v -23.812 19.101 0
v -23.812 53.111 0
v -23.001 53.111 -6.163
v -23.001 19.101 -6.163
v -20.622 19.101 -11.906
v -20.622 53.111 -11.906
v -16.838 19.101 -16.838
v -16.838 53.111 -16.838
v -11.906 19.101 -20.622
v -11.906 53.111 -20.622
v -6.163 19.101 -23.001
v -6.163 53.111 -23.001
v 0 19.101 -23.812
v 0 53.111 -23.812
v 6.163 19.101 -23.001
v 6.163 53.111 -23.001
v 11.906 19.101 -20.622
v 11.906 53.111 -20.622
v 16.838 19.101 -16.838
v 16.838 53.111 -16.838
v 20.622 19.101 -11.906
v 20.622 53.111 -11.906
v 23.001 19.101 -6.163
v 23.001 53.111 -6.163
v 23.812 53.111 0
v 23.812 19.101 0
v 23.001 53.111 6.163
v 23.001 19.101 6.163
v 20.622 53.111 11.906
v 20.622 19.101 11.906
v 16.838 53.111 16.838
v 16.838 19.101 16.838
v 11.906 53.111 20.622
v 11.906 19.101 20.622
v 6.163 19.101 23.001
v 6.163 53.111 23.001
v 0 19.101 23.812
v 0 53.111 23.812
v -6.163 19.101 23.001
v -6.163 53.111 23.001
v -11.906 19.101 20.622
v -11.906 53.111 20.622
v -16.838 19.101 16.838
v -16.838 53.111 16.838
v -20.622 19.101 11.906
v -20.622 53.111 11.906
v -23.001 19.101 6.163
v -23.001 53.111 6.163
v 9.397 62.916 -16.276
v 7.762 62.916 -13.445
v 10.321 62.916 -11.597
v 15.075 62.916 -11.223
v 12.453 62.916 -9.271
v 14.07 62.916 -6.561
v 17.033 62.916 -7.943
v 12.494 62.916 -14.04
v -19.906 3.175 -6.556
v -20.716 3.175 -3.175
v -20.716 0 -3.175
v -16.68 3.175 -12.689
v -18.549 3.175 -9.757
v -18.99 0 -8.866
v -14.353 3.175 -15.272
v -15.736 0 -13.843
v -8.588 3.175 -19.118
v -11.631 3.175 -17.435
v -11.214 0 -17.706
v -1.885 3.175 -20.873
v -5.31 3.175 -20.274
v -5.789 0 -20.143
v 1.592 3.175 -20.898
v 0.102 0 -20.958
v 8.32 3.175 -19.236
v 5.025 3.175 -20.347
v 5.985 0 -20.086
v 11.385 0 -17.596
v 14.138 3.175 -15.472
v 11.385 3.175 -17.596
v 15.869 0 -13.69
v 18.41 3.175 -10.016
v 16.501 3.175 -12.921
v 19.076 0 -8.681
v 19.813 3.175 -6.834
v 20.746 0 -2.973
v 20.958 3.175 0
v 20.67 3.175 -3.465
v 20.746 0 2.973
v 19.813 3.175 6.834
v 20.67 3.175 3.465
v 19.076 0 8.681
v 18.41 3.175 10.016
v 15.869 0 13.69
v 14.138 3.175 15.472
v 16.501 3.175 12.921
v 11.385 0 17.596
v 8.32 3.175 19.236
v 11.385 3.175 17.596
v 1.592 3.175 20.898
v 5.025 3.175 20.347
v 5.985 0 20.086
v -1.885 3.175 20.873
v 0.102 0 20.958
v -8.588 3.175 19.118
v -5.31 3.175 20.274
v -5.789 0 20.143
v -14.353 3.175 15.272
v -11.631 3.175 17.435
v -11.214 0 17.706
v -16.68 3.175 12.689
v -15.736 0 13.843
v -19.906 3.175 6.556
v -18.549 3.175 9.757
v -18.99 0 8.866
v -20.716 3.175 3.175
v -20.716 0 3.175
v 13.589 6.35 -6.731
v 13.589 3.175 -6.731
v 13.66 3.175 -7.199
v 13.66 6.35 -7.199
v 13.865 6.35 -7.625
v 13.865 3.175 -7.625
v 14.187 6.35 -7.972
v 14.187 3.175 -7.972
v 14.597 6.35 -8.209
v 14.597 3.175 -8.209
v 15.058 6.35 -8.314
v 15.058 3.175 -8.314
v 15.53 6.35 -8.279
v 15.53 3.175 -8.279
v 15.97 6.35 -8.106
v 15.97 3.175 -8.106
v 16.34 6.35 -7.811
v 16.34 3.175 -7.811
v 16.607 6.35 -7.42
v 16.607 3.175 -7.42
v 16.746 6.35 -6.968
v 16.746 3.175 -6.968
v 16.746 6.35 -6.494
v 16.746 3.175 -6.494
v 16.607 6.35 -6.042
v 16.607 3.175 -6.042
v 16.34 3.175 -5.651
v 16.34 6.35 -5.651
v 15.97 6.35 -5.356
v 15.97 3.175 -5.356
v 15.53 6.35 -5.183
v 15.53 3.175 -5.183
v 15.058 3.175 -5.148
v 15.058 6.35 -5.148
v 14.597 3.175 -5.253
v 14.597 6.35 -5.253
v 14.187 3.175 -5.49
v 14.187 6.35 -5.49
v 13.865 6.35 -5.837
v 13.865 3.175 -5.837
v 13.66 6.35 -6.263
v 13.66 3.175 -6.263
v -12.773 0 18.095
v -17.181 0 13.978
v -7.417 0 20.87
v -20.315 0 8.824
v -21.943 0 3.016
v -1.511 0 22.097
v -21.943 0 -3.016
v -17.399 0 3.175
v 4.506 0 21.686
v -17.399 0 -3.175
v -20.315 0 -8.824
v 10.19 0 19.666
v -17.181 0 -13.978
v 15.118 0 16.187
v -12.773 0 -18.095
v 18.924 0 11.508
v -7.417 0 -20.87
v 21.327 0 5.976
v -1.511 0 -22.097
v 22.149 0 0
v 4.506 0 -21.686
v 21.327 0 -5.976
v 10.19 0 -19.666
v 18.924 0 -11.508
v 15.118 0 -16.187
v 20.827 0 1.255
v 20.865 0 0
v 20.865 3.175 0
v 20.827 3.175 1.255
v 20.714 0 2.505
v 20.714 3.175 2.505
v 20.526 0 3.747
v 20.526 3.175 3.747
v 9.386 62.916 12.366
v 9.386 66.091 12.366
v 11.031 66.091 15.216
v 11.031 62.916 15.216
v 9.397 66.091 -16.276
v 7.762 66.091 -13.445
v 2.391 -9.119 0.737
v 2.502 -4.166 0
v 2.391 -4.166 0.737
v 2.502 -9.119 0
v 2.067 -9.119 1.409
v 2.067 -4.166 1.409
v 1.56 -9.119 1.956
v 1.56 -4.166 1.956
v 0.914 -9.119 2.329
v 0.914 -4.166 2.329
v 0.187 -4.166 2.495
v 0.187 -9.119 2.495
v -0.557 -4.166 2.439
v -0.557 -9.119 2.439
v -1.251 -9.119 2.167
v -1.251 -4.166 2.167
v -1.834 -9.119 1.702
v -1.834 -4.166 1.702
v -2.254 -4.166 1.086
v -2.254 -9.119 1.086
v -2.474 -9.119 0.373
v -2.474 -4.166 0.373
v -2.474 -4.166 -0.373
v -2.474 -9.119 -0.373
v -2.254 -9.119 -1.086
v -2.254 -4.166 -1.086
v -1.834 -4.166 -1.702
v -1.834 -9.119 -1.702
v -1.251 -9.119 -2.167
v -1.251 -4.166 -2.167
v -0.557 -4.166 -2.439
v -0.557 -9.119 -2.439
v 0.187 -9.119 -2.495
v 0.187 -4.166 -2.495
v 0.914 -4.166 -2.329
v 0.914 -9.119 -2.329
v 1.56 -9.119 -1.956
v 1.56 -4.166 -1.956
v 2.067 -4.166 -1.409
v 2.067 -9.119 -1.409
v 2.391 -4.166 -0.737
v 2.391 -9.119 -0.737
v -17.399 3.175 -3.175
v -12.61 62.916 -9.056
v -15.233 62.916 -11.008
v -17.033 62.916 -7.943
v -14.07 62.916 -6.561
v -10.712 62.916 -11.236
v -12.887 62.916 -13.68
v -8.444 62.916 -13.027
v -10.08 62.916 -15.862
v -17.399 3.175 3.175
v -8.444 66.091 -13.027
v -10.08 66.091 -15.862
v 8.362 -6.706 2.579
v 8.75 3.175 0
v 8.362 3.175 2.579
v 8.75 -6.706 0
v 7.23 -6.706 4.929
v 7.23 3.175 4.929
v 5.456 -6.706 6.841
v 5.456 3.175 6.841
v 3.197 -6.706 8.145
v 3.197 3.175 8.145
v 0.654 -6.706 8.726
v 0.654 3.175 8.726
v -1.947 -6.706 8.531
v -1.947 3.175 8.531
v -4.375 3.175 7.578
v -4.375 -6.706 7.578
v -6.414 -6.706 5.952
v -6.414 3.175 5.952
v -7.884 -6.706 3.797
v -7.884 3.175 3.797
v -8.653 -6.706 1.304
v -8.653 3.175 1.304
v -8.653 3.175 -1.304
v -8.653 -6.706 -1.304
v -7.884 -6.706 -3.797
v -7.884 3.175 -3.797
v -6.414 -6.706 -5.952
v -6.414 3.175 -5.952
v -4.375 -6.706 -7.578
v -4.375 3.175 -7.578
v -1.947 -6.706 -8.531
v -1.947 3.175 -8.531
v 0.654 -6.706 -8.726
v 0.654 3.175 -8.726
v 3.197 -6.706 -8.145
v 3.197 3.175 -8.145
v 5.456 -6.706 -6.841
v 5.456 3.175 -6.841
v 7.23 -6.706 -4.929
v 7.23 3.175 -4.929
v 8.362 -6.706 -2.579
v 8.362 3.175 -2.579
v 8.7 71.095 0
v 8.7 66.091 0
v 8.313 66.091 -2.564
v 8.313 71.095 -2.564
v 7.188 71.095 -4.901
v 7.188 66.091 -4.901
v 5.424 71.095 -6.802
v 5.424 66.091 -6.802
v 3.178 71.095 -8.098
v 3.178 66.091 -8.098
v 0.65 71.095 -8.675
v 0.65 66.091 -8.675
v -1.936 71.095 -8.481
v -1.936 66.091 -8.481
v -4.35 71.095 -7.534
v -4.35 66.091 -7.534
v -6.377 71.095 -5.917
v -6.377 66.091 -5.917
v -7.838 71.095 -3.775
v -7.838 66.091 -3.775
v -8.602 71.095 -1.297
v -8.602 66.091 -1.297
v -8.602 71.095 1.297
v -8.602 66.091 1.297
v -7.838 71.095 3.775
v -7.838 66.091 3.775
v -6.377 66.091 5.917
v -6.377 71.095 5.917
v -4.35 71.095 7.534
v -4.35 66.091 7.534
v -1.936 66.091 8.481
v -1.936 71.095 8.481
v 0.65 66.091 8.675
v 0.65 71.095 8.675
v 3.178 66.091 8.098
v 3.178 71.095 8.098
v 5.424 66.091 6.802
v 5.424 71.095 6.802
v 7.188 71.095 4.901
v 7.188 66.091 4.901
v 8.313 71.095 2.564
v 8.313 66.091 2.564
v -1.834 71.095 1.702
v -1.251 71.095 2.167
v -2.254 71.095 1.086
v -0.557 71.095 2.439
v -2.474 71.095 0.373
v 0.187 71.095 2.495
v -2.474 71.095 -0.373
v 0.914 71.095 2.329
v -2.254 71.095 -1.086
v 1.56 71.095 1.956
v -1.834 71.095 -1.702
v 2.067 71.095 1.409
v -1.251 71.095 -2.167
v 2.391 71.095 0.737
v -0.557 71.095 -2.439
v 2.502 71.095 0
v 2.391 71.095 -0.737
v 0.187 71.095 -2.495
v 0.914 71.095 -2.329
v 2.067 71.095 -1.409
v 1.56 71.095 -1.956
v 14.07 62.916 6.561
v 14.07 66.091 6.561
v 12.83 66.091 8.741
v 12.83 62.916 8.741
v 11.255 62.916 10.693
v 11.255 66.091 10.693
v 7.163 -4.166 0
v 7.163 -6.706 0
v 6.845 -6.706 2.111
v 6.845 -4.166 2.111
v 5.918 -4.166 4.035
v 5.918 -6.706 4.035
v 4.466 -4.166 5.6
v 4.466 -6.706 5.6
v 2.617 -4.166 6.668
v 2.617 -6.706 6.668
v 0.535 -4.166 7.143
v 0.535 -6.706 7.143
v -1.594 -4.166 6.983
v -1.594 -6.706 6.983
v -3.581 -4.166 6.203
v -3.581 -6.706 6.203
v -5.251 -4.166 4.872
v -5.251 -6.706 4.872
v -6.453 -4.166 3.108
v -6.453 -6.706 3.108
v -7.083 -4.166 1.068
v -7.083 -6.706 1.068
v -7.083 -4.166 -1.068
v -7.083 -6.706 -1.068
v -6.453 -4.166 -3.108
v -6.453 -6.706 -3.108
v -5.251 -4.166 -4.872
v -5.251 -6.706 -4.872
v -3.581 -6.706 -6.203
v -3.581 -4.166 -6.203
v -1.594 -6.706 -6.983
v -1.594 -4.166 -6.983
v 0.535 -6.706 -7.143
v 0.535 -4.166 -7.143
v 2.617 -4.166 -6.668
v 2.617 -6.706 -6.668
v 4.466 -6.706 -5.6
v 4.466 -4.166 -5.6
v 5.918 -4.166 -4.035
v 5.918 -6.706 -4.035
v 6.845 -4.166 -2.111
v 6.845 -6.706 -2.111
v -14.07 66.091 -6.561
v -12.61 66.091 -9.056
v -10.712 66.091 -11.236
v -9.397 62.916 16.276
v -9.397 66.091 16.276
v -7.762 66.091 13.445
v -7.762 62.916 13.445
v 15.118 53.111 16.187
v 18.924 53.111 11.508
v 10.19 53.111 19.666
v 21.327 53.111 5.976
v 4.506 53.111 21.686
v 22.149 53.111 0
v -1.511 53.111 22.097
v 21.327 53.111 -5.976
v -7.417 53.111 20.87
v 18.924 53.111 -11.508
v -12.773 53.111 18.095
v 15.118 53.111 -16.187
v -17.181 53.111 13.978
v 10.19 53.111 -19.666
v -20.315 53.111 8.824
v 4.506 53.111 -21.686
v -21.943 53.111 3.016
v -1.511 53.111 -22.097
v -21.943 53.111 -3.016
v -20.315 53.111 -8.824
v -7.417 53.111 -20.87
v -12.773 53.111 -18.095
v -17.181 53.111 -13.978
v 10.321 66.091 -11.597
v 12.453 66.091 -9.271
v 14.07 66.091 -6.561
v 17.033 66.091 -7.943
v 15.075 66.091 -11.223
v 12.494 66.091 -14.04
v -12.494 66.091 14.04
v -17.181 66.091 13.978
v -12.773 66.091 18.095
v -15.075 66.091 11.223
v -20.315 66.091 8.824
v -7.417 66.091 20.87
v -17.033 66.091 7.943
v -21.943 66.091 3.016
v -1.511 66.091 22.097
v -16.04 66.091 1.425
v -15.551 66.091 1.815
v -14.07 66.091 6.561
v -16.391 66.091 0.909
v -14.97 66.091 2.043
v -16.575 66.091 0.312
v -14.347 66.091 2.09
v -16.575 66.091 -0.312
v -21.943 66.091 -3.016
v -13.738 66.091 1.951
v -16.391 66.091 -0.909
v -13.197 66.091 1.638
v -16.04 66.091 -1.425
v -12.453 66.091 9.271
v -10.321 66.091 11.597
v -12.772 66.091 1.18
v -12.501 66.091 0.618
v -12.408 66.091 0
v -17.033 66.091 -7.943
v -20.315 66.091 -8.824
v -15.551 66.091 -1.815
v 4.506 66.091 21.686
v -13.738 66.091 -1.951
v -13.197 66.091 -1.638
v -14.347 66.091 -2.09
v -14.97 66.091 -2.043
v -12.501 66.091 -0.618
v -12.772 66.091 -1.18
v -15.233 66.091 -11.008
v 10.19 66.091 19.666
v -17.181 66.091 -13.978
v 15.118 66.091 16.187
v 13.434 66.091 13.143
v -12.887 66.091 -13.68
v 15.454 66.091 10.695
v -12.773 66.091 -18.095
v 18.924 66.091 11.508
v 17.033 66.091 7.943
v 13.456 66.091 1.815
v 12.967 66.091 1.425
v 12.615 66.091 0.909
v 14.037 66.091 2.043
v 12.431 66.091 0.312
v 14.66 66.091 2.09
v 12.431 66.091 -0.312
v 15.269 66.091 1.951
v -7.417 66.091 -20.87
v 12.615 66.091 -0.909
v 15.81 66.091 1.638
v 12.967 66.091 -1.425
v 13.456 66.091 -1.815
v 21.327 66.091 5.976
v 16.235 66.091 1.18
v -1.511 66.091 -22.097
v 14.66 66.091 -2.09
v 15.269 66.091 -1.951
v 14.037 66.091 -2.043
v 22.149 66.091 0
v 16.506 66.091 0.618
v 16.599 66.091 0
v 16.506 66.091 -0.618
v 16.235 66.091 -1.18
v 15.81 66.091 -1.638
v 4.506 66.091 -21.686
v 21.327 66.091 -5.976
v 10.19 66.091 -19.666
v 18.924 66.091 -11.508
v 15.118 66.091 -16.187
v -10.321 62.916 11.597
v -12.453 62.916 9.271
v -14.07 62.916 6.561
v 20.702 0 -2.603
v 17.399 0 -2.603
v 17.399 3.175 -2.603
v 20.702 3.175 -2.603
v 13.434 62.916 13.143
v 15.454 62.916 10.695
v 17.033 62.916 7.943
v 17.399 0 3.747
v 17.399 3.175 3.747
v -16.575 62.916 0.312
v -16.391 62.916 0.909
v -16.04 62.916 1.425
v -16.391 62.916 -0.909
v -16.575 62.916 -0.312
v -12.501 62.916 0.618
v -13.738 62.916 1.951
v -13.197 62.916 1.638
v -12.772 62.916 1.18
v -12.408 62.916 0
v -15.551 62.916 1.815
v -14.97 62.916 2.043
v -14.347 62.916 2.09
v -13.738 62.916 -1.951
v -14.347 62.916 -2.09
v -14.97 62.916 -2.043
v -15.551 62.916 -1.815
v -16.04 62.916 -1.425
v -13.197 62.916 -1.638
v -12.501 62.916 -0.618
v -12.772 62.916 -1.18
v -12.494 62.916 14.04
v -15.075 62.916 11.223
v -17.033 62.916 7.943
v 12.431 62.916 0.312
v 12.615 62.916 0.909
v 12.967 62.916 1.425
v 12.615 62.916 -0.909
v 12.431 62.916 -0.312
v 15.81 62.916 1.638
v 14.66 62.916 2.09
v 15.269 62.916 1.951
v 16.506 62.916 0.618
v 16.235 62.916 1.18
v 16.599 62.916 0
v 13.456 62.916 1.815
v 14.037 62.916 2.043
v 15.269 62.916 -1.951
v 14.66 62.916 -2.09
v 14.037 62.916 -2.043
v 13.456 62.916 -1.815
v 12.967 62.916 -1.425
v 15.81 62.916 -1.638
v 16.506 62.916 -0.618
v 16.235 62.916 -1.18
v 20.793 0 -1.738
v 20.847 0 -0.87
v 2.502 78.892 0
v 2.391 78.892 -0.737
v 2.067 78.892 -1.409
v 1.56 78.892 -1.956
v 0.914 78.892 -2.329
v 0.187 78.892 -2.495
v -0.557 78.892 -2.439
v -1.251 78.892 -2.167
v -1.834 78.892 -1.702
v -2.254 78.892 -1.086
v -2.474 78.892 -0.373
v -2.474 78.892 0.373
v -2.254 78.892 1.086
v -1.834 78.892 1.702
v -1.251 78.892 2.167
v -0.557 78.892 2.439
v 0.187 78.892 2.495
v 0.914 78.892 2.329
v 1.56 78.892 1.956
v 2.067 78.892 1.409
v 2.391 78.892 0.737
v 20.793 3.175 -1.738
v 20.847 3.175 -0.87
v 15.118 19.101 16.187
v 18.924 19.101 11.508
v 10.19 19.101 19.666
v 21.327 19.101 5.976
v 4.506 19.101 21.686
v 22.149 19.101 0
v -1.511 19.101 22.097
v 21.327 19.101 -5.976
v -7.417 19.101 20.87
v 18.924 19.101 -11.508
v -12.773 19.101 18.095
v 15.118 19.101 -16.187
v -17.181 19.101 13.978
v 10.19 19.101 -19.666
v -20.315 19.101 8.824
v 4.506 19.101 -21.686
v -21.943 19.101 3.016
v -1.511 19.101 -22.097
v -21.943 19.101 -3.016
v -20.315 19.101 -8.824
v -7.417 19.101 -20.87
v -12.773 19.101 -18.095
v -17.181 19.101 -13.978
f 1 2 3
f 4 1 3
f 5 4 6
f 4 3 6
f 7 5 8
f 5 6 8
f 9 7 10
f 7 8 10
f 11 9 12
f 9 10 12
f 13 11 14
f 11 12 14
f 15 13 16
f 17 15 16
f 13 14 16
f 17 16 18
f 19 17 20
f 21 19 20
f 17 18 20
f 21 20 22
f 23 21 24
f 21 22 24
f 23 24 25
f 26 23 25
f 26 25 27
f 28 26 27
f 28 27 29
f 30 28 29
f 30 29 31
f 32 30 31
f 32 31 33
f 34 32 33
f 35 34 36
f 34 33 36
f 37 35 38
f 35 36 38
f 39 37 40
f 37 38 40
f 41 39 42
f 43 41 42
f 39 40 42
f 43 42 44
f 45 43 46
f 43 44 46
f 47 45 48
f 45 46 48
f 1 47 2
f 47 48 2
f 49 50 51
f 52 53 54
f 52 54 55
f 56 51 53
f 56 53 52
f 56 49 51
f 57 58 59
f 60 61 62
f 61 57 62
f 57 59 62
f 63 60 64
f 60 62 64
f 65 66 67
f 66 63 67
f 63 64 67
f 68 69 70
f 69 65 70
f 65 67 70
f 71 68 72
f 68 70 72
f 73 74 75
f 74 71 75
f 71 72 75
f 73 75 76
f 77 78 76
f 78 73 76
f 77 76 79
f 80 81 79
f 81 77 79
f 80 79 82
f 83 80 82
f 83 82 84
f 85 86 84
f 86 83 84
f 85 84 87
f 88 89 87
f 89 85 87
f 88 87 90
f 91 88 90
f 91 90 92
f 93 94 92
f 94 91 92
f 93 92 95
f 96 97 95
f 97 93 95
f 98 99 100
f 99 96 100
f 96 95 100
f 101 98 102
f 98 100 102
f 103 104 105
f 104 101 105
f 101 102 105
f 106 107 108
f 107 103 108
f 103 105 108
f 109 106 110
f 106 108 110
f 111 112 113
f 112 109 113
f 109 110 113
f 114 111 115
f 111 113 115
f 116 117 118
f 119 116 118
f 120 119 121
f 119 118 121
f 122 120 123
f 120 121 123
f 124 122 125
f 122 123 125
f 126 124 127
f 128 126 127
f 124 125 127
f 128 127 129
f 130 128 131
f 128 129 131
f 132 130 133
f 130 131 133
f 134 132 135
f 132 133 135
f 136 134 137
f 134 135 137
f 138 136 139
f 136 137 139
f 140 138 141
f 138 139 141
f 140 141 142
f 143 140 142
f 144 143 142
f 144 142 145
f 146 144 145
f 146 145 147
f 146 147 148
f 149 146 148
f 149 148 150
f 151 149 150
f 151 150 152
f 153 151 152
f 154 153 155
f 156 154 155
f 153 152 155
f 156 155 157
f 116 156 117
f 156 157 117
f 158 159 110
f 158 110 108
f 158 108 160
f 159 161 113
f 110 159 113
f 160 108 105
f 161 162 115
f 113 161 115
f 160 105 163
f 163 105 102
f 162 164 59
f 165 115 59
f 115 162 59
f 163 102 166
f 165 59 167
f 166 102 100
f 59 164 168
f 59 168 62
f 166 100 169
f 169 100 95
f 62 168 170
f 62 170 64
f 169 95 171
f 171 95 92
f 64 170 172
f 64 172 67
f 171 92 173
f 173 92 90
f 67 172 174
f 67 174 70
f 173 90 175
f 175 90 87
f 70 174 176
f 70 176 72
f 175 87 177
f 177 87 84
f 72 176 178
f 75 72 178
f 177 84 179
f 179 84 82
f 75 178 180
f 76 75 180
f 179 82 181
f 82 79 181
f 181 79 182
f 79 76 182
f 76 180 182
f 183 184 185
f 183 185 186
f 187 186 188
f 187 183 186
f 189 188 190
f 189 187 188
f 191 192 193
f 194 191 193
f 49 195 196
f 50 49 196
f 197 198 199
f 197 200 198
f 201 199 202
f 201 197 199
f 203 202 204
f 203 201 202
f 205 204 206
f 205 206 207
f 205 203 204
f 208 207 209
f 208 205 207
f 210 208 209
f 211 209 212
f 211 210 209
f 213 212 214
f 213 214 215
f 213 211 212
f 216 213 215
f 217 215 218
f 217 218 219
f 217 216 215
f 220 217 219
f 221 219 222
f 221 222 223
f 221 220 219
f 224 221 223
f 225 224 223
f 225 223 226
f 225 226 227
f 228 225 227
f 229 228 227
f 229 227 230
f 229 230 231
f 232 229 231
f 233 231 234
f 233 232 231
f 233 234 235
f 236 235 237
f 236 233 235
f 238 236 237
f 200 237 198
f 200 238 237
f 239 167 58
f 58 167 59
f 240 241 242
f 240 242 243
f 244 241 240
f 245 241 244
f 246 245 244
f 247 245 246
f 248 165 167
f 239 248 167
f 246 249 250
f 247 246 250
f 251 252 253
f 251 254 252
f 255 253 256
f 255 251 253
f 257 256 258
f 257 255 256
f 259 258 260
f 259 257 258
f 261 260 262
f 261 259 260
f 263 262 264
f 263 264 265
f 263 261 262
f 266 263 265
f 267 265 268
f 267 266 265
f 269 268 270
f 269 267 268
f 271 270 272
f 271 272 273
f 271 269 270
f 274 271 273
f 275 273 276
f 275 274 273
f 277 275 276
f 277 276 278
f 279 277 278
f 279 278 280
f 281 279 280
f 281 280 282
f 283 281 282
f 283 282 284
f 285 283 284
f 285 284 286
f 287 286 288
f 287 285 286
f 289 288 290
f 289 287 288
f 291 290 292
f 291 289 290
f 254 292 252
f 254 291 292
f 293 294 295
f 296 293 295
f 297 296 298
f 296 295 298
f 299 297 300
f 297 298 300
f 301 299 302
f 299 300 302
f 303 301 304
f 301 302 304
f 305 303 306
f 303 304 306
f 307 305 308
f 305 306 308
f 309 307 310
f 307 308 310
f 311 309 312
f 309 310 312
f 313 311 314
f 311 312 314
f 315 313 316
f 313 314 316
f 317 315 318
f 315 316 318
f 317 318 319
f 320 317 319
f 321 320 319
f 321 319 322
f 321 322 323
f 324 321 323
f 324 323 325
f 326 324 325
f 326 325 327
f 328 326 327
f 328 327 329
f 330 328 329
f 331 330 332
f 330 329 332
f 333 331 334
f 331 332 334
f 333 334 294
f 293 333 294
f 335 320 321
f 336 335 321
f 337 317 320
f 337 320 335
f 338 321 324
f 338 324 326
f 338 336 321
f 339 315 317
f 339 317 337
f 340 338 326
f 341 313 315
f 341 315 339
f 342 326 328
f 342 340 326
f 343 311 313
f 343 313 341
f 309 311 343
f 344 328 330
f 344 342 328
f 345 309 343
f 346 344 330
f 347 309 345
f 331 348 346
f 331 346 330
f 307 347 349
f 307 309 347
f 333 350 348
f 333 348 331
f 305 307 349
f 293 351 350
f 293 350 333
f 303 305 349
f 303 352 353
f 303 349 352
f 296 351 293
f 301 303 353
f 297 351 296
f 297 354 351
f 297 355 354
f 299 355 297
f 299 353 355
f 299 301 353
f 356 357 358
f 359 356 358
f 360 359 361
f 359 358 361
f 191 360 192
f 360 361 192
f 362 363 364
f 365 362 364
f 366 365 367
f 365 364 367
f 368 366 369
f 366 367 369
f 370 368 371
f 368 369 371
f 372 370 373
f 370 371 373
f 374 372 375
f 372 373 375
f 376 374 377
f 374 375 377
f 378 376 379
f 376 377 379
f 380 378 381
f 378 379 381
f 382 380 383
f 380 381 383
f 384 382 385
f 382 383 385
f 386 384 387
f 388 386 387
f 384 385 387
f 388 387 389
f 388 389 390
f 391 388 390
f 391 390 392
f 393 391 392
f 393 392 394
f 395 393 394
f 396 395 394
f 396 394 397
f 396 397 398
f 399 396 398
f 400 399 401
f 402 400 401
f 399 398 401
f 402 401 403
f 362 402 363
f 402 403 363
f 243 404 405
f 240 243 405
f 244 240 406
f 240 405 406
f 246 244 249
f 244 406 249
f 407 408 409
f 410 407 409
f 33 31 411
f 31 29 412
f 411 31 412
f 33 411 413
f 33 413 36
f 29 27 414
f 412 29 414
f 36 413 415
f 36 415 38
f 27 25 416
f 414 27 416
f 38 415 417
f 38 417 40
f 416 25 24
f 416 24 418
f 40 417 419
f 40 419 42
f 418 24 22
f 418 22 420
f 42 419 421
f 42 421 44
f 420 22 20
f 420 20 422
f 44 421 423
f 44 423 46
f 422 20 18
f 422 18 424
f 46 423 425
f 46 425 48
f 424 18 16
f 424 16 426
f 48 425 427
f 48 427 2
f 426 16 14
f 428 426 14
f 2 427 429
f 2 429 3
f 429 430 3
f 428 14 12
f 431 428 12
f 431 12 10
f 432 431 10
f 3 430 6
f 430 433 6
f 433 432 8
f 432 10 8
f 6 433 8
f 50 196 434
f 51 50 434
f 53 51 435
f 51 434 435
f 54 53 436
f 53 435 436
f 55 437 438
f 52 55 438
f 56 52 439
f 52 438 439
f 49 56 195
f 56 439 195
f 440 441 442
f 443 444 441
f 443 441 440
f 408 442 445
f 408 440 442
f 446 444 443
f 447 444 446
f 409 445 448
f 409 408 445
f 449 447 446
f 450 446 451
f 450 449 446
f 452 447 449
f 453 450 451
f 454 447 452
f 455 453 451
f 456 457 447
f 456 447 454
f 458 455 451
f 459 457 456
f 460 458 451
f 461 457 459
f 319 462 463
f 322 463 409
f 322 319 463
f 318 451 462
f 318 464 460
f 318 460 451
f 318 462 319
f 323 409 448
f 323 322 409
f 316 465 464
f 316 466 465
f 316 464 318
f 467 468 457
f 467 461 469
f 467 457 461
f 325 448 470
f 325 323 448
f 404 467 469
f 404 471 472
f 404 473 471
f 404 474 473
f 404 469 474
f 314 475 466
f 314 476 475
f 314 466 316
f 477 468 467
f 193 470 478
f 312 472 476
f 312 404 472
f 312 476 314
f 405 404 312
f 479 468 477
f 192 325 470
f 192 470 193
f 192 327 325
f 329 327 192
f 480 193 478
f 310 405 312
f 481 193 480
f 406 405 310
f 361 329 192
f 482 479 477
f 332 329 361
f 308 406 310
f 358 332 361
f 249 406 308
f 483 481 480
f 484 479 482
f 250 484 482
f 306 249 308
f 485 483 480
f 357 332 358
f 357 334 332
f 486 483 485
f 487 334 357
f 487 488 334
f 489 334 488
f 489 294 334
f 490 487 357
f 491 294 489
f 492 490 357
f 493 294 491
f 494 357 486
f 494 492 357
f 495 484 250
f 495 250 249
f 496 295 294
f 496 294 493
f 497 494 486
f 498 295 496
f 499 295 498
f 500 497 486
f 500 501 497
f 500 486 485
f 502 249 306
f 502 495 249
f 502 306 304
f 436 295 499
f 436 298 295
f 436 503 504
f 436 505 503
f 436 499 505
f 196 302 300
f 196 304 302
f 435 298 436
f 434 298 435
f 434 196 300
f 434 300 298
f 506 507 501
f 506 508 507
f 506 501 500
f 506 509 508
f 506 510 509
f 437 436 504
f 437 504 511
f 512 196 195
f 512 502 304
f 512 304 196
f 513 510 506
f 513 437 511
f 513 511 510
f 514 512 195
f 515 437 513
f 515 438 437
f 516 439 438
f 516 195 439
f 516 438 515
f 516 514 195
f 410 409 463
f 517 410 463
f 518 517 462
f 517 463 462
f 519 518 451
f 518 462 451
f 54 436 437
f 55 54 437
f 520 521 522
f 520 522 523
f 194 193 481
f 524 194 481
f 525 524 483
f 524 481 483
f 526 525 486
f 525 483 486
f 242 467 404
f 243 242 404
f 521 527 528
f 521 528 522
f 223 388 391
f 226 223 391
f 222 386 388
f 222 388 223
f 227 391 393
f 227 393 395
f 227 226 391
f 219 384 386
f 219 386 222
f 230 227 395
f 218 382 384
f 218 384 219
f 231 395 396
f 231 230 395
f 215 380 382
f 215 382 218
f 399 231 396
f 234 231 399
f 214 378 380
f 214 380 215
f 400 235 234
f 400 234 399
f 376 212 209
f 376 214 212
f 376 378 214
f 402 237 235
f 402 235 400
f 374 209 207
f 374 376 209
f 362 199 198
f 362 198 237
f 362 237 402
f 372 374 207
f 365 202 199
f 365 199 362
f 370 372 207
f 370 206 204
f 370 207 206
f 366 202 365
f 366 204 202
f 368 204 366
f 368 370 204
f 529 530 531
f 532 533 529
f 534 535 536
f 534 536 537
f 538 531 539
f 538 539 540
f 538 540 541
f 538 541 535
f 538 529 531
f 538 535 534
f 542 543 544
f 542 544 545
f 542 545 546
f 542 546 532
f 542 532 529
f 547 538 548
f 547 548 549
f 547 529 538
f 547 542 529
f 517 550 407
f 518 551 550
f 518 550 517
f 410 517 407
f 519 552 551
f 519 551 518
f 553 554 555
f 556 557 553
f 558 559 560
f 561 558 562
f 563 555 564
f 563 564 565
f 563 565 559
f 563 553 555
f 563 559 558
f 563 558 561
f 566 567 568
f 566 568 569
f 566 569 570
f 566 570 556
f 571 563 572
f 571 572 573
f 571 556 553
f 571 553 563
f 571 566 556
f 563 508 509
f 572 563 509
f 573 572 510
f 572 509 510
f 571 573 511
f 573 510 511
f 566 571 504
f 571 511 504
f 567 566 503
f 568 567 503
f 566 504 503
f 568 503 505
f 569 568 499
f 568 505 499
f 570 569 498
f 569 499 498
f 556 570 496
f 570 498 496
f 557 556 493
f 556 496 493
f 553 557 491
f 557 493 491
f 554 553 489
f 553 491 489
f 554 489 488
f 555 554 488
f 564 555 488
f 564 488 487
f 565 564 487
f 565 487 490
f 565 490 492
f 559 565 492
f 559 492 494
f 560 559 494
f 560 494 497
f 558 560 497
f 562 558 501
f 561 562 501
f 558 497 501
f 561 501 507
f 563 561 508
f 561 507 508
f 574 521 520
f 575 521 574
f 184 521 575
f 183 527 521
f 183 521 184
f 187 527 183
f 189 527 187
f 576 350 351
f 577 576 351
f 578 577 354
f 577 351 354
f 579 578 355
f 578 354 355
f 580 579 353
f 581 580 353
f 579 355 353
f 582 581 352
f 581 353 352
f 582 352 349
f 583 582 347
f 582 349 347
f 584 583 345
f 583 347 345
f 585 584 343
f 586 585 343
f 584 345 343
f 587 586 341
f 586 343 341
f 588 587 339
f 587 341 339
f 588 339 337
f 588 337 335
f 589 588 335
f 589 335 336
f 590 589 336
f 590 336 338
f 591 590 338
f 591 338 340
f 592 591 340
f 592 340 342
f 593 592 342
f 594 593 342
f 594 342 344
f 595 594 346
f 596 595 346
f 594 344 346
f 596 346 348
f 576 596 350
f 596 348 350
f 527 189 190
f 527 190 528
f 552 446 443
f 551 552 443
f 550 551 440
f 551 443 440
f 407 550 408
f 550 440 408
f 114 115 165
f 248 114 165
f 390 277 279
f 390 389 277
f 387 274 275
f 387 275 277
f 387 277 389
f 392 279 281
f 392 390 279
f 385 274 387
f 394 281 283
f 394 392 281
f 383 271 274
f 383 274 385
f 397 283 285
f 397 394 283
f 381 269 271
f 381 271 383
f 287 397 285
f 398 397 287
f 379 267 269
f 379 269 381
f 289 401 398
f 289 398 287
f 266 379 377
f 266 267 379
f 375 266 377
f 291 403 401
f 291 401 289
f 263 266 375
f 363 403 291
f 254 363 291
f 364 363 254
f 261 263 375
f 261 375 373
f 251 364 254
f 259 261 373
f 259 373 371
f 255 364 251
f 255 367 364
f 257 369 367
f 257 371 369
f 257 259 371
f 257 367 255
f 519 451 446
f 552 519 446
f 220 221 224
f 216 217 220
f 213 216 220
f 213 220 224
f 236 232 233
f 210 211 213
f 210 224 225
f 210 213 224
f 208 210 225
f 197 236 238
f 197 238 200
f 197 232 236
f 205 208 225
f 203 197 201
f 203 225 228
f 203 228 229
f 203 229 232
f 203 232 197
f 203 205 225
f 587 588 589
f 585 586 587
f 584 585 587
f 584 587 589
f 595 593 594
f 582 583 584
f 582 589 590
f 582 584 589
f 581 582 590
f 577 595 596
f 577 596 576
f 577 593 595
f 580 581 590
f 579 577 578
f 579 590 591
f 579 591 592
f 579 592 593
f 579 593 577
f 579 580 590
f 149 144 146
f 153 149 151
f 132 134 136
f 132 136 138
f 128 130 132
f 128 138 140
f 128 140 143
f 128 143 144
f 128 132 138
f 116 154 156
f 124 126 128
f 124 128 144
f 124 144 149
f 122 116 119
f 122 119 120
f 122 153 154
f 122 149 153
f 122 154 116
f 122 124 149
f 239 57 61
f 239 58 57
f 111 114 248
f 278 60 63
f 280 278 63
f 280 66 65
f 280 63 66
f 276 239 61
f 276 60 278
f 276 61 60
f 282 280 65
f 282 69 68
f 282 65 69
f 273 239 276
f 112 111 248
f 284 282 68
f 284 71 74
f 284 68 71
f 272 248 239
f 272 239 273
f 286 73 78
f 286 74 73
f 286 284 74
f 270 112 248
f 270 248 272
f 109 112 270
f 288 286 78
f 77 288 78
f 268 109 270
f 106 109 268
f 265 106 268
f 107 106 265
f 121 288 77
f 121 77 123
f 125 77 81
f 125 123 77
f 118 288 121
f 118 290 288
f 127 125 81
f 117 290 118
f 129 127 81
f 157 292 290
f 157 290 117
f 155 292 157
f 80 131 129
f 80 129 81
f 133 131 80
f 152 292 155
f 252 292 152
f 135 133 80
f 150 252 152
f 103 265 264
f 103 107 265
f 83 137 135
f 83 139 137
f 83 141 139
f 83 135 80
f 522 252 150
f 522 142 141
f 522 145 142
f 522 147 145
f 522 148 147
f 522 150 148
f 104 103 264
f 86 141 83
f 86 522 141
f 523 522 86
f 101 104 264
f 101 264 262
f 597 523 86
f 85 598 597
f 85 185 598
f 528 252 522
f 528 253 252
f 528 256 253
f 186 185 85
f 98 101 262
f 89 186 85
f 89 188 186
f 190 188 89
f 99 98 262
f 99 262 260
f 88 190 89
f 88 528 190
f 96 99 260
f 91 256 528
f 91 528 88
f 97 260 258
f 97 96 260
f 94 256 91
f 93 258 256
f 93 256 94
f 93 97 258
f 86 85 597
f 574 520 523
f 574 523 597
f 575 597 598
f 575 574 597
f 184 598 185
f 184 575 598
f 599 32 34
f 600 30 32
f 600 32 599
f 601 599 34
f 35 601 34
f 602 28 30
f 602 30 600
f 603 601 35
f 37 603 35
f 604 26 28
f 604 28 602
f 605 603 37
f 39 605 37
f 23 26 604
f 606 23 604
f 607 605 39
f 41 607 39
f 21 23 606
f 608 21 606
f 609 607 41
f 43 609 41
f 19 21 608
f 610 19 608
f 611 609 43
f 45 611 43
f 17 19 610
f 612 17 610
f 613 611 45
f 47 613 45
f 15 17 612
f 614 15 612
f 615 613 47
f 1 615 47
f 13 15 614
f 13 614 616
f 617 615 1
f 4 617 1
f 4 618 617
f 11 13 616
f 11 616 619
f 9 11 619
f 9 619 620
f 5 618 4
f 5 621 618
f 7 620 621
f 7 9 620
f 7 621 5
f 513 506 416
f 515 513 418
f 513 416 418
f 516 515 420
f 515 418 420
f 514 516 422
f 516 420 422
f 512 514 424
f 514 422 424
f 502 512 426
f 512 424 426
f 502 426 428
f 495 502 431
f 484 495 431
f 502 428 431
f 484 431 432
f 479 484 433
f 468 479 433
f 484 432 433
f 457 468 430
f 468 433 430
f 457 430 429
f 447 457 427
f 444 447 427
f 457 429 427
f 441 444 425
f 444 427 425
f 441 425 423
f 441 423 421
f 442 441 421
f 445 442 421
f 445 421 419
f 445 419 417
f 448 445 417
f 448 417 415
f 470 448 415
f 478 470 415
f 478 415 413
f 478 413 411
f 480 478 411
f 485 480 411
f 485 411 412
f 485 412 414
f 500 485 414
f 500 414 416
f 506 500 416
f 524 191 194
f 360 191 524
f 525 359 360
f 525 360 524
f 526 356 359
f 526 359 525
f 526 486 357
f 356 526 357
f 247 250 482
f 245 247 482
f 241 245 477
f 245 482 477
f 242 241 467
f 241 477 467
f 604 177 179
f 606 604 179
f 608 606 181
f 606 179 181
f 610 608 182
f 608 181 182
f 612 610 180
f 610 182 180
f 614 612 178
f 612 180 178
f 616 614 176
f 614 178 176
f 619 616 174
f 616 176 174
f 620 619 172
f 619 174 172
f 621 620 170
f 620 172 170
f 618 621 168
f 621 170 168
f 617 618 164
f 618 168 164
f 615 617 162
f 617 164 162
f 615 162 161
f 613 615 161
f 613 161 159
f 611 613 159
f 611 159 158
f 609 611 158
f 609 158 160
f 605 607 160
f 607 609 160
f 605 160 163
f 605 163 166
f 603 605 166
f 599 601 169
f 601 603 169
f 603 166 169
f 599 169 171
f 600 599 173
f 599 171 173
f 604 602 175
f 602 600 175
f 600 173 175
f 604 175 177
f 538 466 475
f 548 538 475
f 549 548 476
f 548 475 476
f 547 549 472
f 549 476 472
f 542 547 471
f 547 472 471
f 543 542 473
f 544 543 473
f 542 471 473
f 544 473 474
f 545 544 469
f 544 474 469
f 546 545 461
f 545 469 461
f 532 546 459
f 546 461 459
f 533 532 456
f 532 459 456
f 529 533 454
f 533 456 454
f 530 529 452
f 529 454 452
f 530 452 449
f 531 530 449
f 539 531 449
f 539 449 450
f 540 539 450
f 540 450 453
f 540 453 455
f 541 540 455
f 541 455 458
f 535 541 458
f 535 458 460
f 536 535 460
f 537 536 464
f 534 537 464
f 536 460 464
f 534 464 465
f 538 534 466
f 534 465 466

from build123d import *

# Parameters (mm, degrees)
SKETCH2_R            = 22.1488
BOSS_EXTRUDE4_DEPTH  = 66.0908
SKETCH4_R            = 8.6995
BOSS_EXTRUDE5_DEPTH  = 5.0038
SKETCH9_R            = 2.5019
BOSS_EXTRUDE6_DEPTH  = 7.7978
SKETCH10_R           = 8.7503
BOSS_EXTRUDE7_DEPTH  = 6.7056
SKETCH11_R           = 2.5019
BOSS_EXTRUDE8_DEPTH  = 2.413
SKETCH12_R           = 23.8125
BOSS_EXTRUDE9_DEPTH  = 34.0106
SKETCH13_R           = 2.0955
CUT_EXTRUDE1_DEPTH   = 3.175
CUT_EXTRUDE2_DEPTH   = 3.175
SKETCH15_R           = 20.958175
SKETCH15_R_2         = 8.7503
CUT_EXTRUDE3_DEPTH   = 3.175
SKETCH16_R           = 7.1628
SKETCH16_R_2         = 2.5019
CUT_EXTRUDE4_DEPTH   = 2.54
BOSS_EXTRUDE12_DEPTH = 3.175
BOSS_EXTRUDE13_DEPTH = 3.175
SKETCH20_R           = 1.5875
CUT_EXTRUDE5_DEPTH   = 3.175


with BuildPart() as part:
    # Sketch2 → Boss-Extrude4 (new body)
    with BuildSketch(Plane(origin=(0, 0, 0), x_dir=(1, 0, 0), z_dir=(0, 1, 0))):
        Circle(SKETCH2_R)
    extrude(amount=BOSS_EXTRUDE4_DEPTH)

    # Sketch4 → Boss-Extrude5 (add)
    with BuildSketch(Plane(origin=(0, 66.0908, 0), x_dir=(1, 0, 0), z_dir=(0, 1, 0))):
        Circle(SKETCH4_R)
    extrude(amount=BOSS_EXTRUDE5_DEPTH)

    # Sketch9 → Boss-Extrude6 (add)
    with BuildSketch(Plane(origin=(0, 71.0946, 0), x_dir=(1, 0, 0), z_dir=(0, 1, 0))):
        Circle(SKETCH9_R)
    extrude(amount=BOSS_EXTRUDE6_DEPTH)

    # Sketch10 → Boss-Extrude7 (add)
    with BuildSketch(Plane.XZ):
        Circle(SKETCH10_R)
    extrude(amount=BOSS_EXTRUDE7_DEPTH)

    # Sketch11 → Boss-Extrude8 (add)
    with BuildSketch(Plane.XZ.offset(6.7056)):
        Circle(SKETCH11_R)
    extrude(amount=BOSS_EXTRUDE8_DEPTH)

    # Sketch12 → Boss-Extrude9 (add)
    with BuildSketch(Plane(origin=(0, 53.1114, 0), x_dir=(-1, 0, 0), z_dir=(0, -1, 0))):
        Circle(SKETCH12_R)
    extrude(amount=BOSS_EXTRUDE9_DEPTH)

    # Sketch13 → Cut-Extrude1 (cut)
    with BuildSketch(Plane(origin=(0, 66.0908, 0), x_dir=(1, 0, 0), z_dir=(0, 1, 0))):
        with Locations((-14.5034, 0)):
            Circle(SKETCH13_R)
        with Locations((14.5034, 0)):
            Circle(SKETCH13_R)
    extrude(amount=-CUT_EXTRUDE1_DEPTH, mode=Mode.SUBTRACT)

    # Sketch14 → Cut-Extrude2 (cut)
    with BuildSketch(Plane(origin=(0, 66.0908, 0), x_dir=(1, 0, 0), z_dir=(0, 1, 0))):
        with BuildLine():
            Line((-14.070005184, -6.560951168), (-17.033311719, -7.942763698))
            ThreePointArc((-17.033311719, -7.942763698), (-13.856523006, -12.697163994), (-9.397090019, -16.276237356))
            Line((-9.397090019, -16.276237356), (-7.76226652, -13.444639995))
            ThreePointArc((-7.76226652, -13.444639995), (-11.445886375, -10.4882225), (-14.070005184, -6.560951168))
        make_face()
        with BuildLine():
            ThreePointArc((-10.080336815, 15.862156631), (-14.123267338, 12.399779151), (-17.033311719, 7.942763698))
            Line((-17.033311719, 7.942763698), (-14.070005184, 6.560951168))
            ThreePointArc((-14.070005184, 6.560951168), (-11.711998853, 10.190201616), (-8.44372295, 13.027458265))
            Line((-8.44372295, 13.027458265), (-10.080336815, 15.862156631))
        make_face()
        with BuildLine():
            ThreePointArc((17.033311719, 7.942763698), (13.856523006, 12.697163994), (9.397090019, 16.276237356))
            Line((9.397090019, 16.276237356), (7.76226652, 13.444639995))
            ThreePointArc((7.76226652, 13.444639995), (11.445886375, 10.4882225), (14.070005184, 6.560951168))
            Line((14.070005184, 6.560951168), (17.033311719, 7.942763698))
        make_face()
        with BuildLine():
            Line((9.385927189, -12.365900571), (11.031460095, -15.21604717))
            ThreePointArc((11.031460095, -15.21604717), (14.495965555, -11.961947414), (17.033311719, -7.942763698))
            Line((17.033311719, -7.942763698), (14.070005184, -6.560951168))
            ThreePointArc((14.070005184, -6.560951168), (12.081785889, -9.748926908), (9.385927189, -12.365900571))
        make_face()
    extrude(amount=-CUT_EXTRUDE2_DEPTH, mode=Mode.SUBTRACT)

    # Sketch15 → Cut-Extrude3 (cut)
    with BuildSketch(Plane.XZ):
        Circle(SKETCH15_R)
        Circle(SKETCH15_R_2, mode=Mode.SUBTRACT)
    extrude(amount=-CUT_EXTRUDE3_DEPTH, mode=Mode.SUBTRACT)

    # Sketch16 → Cut-Extrude4 (cut)
    with BuildSketch(Plane.XZ.offset(6.7056)):
        Circle(SKETCH16_R)
        Circle(SKETCH16_R_2, mode=Mode.SUBTRACT)
    extrude(amount=-CUT_EXTRUDE4_DEPTH, mode=Mode.SUBTRACT)

    # Sketch18 → Boss-Extrude12 (add)
    with BuildSketch(Plane.XZ):
        with BuildLine():
            ThreePointArc((20.865163654, 0), (20.780212376, 1.88091146), (20.52605029, 3.746506881))
            Line((20.52605029, 3.746506881), (17.399, 3.746506881))
            Line((17.399, 3.746506881), (17.399, -2.603493119))
            Line((17.399, -2.603493119), (20.702098393, -2.603493119))
            ThreePointArc((20.702098393, -2.603493119), (20.824357436, -1.304297387), (20.865163654, 0))
        make_face()
    extrude(amount=-BOSS_EXTRUDE12_DEPTH)

    # Sketch19 → Boss-Extrude13 (add)
    with BuildSketch(Plane(origin=(0, 0, 0), x_dir=(-1, 0, 0), z_dir=(0, -1, 0))):
        with BuildLine():
            Line((20.716285244, -3.175), (17.399, -3.175))
            Line((17.399, -3.175), (17.399, 3.175))
            Line((17.399, 3.175), (20.716285244, 3.175))
            ThreePointArc((20.716285244, 3.175), (20.958175, 0), (20.716285244, -3.175))
        make_face()
    extrude(amount=-BOSS_EXTRUDE13_DEPTH)

    # Sketch20 → Cut-Extrude5 (cut)
    with BuildSketch(Plane(origin=(0, 3.175, 0), x_dir=(-1, 0, 0), z_dir=(0, -1, 0))):
        with Locations((-15.1765, 6.730993119)):
            Circle(SKETCH20_R)
    extrude(amount=-CUT_EXTRUDE5_DEPTH, mode=Mode.SUBTRACT)


solid = part.part
